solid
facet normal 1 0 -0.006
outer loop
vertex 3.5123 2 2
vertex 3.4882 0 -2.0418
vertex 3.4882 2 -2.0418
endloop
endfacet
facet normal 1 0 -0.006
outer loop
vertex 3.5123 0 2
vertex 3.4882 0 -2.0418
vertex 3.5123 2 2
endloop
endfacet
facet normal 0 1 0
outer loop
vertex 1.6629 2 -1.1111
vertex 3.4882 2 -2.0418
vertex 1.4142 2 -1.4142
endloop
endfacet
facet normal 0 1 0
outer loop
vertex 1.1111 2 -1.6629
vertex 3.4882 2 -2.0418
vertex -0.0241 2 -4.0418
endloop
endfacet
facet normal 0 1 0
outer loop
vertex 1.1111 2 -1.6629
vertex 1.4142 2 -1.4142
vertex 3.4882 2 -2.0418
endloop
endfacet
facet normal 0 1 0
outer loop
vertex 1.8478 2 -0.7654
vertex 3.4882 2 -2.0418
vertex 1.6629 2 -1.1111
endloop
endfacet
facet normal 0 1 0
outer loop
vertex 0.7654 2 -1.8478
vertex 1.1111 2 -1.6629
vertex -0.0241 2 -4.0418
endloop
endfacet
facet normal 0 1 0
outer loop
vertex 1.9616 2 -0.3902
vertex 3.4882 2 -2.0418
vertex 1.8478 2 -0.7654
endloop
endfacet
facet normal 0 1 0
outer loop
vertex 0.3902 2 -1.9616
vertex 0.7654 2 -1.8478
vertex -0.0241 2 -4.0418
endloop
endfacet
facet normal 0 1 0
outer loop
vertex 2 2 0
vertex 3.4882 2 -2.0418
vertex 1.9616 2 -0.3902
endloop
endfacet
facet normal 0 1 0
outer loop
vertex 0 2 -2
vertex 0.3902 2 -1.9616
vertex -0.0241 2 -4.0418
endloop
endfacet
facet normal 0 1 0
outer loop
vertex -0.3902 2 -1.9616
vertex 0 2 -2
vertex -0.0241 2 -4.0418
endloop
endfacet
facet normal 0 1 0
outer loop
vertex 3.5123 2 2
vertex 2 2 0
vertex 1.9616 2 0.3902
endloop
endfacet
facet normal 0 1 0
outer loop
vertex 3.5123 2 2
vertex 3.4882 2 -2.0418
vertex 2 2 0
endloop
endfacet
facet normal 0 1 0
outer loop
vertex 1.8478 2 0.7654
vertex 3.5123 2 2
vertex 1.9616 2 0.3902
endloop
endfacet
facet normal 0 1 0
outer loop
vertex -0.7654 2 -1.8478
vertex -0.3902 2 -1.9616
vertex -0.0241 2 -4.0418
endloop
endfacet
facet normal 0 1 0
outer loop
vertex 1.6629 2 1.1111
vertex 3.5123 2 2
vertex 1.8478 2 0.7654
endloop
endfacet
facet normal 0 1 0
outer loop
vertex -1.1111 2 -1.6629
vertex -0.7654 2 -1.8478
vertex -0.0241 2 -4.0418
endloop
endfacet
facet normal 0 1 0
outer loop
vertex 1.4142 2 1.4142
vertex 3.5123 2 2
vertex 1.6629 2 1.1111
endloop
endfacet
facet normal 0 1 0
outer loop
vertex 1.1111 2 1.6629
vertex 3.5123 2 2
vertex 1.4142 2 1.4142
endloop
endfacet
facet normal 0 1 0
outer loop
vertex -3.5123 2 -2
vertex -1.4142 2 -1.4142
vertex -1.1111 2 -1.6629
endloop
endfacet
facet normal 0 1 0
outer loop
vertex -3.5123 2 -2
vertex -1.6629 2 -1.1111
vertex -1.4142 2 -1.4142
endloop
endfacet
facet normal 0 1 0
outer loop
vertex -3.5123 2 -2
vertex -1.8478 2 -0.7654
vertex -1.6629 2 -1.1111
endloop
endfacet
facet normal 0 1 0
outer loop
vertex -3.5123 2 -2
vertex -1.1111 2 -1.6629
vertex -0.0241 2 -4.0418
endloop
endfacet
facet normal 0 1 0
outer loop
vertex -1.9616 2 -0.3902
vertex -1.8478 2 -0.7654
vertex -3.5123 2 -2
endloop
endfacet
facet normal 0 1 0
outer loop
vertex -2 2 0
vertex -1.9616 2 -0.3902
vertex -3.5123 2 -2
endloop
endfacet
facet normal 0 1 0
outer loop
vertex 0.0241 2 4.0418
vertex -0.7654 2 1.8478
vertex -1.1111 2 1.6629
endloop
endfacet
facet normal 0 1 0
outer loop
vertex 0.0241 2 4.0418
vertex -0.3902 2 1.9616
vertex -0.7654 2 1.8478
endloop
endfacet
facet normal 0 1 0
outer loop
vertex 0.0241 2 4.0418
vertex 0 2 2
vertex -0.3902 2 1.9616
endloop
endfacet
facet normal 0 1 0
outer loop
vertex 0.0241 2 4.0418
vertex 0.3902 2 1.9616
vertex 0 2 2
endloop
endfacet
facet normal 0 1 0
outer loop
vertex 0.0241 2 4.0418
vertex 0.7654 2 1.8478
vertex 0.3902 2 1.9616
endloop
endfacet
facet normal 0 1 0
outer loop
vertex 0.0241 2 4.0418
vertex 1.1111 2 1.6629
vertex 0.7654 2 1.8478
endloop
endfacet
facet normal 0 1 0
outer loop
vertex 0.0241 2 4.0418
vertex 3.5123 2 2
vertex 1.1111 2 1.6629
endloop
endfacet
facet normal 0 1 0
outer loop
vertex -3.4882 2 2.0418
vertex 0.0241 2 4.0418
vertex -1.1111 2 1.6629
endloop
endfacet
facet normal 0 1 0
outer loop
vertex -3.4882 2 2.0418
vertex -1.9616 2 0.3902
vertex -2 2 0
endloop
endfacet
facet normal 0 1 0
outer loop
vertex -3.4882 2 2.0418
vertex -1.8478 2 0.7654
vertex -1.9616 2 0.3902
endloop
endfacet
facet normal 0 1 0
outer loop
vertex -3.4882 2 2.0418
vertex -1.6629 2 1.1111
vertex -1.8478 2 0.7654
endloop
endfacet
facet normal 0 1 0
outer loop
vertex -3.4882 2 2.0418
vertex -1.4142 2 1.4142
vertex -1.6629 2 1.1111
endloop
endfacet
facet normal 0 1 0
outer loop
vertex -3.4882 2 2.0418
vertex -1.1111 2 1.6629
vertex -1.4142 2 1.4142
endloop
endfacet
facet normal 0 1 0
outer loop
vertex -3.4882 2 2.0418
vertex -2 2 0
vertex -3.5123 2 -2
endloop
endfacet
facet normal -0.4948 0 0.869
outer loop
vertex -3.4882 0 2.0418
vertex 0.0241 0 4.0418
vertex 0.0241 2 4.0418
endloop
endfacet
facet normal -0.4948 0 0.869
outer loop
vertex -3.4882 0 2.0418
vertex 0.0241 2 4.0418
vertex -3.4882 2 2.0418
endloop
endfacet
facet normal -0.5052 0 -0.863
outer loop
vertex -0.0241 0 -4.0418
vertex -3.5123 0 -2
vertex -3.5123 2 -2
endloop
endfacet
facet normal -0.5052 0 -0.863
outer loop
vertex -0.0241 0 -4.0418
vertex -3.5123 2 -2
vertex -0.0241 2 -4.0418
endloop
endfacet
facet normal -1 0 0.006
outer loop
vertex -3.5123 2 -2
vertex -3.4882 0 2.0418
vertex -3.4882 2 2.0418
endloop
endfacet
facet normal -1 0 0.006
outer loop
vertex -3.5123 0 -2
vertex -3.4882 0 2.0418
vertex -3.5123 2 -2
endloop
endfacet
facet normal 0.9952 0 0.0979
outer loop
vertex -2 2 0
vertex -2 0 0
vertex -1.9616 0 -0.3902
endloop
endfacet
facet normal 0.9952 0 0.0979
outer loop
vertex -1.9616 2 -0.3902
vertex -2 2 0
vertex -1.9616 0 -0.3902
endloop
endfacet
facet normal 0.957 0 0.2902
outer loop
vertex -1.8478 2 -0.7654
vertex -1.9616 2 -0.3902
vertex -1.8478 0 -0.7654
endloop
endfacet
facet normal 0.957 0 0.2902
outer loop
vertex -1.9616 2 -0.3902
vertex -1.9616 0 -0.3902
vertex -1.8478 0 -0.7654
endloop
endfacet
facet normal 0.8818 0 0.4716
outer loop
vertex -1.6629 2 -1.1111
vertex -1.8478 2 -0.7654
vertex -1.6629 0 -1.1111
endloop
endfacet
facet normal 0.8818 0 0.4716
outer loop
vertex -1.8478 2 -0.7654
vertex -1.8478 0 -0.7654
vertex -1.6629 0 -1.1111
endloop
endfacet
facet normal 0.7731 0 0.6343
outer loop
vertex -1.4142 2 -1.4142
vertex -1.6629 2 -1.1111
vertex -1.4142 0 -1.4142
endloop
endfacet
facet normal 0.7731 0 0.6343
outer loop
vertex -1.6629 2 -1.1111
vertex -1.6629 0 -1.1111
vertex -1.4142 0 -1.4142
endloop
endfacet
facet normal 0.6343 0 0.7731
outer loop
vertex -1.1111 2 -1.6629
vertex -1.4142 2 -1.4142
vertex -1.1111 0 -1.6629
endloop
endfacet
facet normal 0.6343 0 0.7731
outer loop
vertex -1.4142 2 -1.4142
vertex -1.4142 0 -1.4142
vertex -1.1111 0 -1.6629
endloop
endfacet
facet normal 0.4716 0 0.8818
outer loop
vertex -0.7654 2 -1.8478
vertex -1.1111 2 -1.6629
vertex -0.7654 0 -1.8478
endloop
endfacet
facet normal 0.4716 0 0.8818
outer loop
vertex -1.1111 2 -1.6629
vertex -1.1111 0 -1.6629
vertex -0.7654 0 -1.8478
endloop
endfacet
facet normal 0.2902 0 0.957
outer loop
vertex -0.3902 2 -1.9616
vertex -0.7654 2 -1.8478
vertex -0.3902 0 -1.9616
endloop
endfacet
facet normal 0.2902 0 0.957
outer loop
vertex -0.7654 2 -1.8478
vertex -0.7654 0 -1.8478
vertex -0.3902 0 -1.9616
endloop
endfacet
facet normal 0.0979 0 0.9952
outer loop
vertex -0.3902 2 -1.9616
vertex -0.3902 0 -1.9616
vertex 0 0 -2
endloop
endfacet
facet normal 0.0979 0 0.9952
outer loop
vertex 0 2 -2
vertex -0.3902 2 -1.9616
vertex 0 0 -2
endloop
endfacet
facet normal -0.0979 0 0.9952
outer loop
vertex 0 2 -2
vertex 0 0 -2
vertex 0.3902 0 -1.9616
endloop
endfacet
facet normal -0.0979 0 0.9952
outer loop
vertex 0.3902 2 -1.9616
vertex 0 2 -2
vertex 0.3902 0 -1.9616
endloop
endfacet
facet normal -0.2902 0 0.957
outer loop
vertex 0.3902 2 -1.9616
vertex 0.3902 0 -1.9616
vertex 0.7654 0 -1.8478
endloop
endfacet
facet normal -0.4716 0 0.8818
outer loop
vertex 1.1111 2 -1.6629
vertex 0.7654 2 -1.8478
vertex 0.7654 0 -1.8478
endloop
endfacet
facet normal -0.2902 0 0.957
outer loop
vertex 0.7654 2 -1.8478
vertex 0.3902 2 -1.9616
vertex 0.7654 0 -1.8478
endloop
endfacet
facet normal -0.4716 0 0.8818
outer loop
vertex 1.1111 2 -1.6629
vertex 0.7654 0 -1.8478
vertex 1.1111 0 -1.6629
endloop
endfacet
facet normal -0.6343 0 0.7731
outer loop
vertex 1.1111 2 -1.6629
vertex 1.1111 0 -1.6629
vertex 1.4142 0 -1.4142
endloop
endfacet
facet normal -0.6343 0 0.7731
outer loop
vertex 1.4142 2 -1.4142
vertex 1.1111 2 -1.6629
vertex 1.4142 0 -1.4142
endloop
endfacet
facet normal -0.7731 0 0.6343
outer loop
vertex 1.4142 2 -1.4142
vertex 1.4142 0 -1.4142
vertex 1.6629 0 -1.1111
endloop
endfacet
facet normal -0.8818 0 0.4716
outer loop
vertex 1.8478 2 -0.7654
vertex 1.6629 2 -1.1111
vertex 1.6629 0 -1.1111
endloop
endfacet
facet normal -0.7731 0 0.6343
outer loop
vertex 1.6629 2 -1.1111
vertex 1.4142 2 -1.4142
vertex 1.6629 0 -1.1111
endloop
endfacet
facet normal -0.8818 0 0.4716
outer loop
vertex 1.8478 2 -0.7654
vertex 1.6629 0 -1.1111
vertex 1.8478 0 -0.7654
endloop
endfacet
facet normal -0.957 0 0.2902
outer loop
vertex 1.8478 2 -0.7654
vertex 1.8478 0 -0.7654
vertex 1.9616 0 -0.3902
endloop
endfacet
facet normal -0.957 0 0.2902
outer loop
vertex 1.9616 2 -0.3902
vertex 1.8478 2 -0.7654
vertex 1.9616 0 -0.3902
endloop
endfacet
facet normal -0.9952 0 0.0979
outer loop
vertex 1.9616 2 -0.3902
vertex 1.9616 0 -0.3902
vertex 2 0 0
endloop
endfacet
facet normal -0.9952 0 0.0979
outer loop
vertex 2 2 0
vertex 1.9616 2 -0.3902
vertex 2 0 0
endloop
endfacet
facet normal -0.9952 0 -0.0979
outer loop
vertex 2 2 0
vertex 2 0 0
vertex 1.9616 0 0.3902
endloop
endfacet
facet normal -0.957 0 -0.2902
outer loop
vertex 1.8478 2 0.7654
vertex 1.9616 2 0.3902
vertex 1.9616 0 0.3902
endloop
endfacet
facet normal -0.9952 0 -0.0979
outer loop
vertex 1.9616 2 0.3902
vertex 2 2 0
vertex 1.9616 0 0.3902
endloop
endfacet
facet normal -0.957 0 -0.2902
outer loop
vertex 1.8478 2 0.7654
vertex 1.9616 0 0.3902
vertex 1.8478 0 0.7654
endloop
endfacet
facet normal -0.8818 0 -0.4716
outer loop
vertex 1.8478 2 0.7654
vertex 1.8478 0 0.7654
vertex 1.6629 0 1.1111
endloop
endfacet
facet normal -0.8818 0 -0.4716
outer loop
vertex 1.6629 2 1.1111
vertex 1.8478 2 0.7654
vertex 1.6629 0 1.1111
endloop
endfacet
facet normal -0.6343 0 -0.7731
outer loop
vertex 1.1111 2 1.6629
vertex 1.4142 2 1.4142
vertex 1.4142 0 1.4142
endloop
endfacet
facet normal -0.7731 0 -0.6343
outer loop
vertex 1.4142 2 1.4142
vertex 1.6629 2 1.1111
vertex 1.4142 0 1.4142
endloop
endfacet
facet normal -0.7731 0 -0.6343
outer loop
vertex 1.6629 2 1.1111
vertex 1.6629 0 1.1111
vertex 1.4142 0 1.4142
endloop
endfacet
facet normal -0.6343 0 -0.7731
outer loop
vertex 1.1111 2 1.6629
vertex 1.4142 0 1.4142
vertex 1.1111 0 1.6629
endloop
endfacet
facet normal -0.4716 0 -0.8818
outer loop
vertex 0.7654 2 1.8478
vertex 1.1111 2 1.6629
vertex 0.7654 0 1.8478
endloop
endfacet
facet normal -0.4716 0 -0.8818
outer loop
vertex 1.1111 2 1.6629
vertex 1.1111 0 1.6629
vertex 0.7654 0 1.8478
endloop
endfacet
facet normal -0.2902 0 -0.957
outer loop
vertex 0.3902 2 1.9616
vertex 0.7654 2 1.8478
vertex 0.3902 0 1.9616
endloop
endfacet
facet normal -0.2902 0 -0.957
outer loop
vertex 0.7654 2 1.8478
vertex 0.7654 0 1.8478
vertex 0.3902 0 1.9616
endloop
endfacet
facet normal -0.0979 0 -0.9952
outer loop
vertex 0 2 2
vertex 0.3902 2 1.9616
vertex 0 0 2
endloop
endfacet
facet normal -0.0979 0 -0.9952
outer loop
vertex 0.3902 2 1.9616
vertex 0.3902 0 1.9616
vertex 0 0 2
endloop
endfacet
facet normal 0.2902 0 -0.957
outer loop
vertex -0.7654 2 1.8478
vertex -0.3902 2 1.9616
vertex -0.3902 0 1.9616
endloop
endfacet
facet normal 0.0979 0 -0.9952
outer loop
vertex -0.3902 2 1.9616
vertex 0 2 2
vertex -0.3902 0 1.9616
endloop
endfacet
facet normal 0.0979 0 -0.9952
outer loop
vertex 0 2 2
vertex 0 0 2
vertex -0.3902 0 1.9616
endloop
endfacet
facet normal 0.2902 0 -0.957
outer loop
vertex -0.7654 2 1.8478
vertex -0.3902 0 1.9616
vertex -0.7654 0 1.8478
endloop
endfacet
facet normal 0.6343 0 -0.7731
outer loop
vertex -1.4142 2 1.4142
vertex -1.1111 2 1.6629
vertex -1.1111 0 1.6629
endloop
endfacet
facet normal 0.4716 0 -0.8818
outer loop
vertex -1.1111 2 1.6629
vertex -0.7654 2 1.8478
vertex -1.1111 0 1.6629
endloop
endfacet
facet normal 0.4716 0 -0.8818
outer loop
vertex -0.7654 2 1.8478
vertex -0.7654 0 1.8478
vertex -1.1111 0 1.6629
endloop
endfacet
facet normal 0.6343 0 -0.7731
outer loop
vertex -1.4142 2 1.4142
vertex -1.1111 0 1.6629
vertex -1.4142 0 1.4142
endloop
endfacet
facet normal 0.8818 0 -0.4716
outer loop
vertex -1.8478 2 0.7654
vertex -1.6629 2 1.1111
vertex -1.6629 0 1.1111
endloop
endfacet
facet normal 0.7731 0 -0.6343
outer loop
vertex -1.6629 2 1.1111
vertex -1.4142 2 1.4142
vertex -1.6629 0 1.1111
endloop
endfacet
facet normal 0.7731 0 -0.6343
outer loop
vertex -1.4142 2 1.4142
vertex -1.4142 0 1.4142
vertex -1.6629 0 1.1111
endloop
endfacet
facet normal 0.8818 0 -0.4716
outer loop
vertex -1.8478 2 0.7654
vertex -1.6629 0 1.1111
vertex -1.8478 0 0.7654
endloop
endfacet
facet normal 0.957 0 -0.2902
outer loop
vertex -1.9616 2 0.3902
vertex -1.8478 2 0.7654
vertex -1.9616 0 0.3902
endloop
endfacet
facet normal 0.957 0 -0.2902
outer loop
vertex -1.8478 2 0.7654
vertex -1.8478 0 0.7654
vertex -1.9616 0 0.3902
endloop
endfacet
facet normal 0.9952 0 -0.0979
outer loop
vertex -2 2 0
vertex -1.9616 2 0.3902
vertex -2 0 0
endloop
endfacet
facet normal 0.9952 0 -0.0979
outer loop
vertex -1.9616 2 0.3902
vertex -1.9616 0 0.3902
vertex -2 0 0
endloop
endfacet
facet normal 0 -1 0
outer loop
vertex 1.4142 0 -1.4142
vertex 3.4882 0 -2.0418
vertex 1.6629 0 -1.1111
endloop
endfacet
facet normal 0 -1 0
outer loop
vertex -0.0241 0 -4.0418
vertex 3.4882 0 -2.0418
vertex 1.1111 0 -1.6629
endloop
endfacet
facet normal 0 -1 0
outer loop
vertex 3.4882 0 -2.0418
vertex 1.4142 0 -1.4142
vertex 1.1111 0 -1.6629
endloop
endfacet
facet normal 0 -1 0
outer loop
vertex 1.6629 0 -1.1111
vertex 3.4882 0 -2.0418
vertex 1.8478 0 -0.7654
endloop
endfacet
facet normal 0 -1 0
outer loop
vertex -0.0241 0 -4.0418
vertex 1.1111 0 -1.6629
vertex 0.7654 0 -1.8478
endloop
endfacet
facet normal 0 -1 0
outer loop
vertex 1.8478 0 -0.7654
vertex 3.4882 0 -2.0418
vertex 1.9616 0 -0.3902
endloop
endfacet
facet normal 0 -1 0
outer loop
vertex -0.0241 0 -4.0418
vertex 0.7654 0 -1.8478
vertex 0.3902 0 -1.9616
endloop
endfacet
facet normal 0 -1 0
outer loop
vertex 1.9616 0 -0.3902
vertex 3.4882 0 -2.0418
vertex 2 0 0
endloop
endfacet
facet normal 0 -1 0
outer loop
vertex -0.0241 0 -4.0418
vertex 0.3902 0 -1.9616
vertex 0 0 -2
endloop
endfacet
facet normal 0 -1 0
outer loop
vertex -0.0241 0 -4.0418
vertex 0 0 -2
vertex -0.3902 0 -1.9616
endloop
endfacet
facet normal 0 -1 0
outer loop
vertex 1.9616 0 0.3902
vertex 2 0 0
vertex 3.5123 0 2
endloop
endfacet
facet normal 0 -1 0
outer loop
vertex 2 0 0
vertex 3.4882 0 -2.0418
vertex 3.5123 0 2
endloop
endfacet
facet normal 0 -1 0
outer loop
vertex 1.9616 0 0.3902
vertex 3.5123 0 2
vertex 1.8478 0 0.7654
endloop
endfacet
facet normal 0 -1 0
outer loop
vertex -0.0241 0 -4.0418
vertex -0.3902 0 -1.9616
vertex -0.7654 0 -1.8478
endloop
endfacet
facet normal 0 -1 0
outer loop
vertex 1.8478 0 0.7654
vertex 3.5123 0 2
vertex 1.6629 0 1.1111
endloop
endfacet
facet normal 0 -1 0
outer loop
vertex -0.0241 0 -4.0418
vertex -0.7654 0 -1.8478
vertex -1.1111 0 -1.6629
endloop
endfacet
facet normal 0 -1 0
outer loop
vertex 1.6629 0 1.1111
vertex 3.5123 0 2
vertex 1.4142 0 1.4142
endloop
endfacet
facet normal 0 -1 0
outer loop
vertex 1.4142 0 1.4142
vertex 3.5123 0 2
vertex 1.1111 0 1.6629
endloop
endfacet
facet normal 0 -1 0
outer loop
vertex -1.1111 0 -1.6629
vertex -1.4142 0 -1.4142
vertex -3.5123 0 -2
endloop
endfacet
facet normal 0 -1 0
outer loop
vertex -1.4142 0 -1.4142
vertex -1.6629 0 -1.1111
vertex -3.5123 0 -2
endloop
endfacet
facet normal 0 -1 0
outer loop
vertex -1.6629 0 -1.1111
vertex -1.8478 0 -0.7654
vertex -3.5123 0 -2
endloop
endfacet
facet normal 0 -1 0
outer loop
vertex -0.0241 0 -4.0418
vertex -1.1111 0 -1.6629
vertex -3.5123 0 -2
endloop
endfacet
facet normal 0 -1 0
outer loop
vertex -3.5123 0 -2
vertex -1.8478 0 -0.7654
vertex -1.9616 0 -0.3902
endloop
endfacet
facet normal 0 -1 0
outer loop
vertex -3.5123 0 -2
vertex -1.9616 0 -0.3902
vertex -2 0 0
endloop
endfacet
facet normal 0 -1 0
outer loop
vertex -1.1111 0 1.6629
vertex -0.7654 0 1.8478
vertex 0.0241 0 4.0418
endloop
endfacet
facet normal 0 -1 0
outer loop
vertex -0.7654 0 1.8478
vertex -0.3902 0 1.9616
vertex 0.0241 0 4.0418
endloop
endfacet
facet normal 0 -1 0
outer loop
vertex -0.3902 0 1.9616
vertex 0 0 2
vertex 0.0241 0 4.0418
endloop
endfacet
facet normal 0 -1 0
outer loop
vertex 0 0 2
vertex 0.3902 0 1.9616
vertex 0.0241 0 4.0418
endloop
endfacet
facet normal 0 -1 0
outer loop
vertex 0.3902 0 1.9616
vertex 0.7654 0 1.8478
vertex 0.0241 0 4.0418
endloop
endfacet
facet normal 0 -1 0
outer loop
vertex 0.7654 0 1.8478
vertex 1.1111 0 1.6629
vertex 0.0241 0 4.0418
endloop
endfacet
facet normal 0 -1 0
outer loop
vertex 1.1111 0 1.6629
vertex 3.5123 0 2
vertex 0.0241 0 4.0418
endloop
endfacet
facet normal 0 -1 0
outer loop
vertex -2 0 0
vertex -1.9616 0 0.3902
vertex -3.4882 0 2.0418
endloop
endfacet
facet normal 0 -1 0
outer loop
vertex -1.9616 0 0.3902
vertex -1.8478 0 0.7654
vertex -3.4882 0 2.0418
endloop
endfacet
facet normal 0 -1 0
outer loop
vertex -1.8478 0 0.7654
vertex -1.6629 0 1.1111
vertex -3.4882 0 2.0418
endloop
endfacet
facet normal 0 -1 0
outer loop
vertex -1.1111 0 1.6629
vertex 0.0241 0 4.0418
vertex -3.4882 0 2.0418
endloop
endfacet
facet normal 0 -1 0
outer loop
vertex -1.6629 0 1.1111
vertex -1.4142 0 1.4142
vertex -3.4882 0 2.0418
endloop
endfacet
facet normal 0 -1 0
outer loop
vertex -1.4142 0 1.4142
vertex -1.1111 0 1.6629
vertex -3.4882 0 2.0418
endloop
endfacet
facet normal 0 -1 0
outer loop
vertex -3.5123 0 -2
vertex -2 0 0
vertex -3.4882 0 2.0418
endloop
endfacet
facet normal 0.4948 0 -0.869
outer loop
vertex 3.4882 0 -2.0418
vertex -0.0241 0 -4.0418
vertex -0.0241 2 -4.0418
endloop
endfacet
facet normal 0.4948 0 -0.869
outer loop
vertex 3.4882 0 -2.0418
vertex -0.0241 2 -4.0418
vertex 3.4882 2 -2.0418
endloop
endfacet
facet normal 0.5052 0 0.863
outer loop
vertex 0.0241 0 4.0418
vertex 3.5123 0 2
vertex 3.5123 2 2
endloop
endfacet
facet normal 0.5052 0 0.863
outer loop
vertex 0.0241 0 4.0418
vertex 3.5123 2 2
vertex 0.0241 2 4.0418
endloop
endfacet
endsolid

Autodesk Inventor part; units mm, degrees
ref_plane "YZ Plane" through (0, 0, 0) normal (1, 0, 0) x (0, 1, 0)
ref_plane "XZ Plane" through (0, 0, 0) normal (0, 1, 0) x (-1, 0, 0)
ref_plane "XY Plane" through (0, 0, 0) normal (0, 0, 1) x (1, 0, 0)
sketch "Sketch1" plane through (0, 0, 0) normal (0, 1, 0) x (-1, 0, 0)
  circle A0 centre (0, 0) radius 2
  line L0 (3.5123, -2) -> (0.0241, -4.0418)
  line L1 (0.0241, -4.0418) -> (-3.4882, -2.0418)
  line L2 (-3.4882, -2.0418) -> (-3.5123, 2)
  line L3 (-3.5123, 2) -> (-0.0241, 4.0418)
  line L4 (-0.0241, 4.0418) -> (3.4882, 2.0418)
  line L5 (3.4882, 2.0418) -> (3.5123, -2)
  dimension "d0" = 4
extrude "Extrusion1" add sketch "Sketch1" along normal blind 2
properties part number "hex"
